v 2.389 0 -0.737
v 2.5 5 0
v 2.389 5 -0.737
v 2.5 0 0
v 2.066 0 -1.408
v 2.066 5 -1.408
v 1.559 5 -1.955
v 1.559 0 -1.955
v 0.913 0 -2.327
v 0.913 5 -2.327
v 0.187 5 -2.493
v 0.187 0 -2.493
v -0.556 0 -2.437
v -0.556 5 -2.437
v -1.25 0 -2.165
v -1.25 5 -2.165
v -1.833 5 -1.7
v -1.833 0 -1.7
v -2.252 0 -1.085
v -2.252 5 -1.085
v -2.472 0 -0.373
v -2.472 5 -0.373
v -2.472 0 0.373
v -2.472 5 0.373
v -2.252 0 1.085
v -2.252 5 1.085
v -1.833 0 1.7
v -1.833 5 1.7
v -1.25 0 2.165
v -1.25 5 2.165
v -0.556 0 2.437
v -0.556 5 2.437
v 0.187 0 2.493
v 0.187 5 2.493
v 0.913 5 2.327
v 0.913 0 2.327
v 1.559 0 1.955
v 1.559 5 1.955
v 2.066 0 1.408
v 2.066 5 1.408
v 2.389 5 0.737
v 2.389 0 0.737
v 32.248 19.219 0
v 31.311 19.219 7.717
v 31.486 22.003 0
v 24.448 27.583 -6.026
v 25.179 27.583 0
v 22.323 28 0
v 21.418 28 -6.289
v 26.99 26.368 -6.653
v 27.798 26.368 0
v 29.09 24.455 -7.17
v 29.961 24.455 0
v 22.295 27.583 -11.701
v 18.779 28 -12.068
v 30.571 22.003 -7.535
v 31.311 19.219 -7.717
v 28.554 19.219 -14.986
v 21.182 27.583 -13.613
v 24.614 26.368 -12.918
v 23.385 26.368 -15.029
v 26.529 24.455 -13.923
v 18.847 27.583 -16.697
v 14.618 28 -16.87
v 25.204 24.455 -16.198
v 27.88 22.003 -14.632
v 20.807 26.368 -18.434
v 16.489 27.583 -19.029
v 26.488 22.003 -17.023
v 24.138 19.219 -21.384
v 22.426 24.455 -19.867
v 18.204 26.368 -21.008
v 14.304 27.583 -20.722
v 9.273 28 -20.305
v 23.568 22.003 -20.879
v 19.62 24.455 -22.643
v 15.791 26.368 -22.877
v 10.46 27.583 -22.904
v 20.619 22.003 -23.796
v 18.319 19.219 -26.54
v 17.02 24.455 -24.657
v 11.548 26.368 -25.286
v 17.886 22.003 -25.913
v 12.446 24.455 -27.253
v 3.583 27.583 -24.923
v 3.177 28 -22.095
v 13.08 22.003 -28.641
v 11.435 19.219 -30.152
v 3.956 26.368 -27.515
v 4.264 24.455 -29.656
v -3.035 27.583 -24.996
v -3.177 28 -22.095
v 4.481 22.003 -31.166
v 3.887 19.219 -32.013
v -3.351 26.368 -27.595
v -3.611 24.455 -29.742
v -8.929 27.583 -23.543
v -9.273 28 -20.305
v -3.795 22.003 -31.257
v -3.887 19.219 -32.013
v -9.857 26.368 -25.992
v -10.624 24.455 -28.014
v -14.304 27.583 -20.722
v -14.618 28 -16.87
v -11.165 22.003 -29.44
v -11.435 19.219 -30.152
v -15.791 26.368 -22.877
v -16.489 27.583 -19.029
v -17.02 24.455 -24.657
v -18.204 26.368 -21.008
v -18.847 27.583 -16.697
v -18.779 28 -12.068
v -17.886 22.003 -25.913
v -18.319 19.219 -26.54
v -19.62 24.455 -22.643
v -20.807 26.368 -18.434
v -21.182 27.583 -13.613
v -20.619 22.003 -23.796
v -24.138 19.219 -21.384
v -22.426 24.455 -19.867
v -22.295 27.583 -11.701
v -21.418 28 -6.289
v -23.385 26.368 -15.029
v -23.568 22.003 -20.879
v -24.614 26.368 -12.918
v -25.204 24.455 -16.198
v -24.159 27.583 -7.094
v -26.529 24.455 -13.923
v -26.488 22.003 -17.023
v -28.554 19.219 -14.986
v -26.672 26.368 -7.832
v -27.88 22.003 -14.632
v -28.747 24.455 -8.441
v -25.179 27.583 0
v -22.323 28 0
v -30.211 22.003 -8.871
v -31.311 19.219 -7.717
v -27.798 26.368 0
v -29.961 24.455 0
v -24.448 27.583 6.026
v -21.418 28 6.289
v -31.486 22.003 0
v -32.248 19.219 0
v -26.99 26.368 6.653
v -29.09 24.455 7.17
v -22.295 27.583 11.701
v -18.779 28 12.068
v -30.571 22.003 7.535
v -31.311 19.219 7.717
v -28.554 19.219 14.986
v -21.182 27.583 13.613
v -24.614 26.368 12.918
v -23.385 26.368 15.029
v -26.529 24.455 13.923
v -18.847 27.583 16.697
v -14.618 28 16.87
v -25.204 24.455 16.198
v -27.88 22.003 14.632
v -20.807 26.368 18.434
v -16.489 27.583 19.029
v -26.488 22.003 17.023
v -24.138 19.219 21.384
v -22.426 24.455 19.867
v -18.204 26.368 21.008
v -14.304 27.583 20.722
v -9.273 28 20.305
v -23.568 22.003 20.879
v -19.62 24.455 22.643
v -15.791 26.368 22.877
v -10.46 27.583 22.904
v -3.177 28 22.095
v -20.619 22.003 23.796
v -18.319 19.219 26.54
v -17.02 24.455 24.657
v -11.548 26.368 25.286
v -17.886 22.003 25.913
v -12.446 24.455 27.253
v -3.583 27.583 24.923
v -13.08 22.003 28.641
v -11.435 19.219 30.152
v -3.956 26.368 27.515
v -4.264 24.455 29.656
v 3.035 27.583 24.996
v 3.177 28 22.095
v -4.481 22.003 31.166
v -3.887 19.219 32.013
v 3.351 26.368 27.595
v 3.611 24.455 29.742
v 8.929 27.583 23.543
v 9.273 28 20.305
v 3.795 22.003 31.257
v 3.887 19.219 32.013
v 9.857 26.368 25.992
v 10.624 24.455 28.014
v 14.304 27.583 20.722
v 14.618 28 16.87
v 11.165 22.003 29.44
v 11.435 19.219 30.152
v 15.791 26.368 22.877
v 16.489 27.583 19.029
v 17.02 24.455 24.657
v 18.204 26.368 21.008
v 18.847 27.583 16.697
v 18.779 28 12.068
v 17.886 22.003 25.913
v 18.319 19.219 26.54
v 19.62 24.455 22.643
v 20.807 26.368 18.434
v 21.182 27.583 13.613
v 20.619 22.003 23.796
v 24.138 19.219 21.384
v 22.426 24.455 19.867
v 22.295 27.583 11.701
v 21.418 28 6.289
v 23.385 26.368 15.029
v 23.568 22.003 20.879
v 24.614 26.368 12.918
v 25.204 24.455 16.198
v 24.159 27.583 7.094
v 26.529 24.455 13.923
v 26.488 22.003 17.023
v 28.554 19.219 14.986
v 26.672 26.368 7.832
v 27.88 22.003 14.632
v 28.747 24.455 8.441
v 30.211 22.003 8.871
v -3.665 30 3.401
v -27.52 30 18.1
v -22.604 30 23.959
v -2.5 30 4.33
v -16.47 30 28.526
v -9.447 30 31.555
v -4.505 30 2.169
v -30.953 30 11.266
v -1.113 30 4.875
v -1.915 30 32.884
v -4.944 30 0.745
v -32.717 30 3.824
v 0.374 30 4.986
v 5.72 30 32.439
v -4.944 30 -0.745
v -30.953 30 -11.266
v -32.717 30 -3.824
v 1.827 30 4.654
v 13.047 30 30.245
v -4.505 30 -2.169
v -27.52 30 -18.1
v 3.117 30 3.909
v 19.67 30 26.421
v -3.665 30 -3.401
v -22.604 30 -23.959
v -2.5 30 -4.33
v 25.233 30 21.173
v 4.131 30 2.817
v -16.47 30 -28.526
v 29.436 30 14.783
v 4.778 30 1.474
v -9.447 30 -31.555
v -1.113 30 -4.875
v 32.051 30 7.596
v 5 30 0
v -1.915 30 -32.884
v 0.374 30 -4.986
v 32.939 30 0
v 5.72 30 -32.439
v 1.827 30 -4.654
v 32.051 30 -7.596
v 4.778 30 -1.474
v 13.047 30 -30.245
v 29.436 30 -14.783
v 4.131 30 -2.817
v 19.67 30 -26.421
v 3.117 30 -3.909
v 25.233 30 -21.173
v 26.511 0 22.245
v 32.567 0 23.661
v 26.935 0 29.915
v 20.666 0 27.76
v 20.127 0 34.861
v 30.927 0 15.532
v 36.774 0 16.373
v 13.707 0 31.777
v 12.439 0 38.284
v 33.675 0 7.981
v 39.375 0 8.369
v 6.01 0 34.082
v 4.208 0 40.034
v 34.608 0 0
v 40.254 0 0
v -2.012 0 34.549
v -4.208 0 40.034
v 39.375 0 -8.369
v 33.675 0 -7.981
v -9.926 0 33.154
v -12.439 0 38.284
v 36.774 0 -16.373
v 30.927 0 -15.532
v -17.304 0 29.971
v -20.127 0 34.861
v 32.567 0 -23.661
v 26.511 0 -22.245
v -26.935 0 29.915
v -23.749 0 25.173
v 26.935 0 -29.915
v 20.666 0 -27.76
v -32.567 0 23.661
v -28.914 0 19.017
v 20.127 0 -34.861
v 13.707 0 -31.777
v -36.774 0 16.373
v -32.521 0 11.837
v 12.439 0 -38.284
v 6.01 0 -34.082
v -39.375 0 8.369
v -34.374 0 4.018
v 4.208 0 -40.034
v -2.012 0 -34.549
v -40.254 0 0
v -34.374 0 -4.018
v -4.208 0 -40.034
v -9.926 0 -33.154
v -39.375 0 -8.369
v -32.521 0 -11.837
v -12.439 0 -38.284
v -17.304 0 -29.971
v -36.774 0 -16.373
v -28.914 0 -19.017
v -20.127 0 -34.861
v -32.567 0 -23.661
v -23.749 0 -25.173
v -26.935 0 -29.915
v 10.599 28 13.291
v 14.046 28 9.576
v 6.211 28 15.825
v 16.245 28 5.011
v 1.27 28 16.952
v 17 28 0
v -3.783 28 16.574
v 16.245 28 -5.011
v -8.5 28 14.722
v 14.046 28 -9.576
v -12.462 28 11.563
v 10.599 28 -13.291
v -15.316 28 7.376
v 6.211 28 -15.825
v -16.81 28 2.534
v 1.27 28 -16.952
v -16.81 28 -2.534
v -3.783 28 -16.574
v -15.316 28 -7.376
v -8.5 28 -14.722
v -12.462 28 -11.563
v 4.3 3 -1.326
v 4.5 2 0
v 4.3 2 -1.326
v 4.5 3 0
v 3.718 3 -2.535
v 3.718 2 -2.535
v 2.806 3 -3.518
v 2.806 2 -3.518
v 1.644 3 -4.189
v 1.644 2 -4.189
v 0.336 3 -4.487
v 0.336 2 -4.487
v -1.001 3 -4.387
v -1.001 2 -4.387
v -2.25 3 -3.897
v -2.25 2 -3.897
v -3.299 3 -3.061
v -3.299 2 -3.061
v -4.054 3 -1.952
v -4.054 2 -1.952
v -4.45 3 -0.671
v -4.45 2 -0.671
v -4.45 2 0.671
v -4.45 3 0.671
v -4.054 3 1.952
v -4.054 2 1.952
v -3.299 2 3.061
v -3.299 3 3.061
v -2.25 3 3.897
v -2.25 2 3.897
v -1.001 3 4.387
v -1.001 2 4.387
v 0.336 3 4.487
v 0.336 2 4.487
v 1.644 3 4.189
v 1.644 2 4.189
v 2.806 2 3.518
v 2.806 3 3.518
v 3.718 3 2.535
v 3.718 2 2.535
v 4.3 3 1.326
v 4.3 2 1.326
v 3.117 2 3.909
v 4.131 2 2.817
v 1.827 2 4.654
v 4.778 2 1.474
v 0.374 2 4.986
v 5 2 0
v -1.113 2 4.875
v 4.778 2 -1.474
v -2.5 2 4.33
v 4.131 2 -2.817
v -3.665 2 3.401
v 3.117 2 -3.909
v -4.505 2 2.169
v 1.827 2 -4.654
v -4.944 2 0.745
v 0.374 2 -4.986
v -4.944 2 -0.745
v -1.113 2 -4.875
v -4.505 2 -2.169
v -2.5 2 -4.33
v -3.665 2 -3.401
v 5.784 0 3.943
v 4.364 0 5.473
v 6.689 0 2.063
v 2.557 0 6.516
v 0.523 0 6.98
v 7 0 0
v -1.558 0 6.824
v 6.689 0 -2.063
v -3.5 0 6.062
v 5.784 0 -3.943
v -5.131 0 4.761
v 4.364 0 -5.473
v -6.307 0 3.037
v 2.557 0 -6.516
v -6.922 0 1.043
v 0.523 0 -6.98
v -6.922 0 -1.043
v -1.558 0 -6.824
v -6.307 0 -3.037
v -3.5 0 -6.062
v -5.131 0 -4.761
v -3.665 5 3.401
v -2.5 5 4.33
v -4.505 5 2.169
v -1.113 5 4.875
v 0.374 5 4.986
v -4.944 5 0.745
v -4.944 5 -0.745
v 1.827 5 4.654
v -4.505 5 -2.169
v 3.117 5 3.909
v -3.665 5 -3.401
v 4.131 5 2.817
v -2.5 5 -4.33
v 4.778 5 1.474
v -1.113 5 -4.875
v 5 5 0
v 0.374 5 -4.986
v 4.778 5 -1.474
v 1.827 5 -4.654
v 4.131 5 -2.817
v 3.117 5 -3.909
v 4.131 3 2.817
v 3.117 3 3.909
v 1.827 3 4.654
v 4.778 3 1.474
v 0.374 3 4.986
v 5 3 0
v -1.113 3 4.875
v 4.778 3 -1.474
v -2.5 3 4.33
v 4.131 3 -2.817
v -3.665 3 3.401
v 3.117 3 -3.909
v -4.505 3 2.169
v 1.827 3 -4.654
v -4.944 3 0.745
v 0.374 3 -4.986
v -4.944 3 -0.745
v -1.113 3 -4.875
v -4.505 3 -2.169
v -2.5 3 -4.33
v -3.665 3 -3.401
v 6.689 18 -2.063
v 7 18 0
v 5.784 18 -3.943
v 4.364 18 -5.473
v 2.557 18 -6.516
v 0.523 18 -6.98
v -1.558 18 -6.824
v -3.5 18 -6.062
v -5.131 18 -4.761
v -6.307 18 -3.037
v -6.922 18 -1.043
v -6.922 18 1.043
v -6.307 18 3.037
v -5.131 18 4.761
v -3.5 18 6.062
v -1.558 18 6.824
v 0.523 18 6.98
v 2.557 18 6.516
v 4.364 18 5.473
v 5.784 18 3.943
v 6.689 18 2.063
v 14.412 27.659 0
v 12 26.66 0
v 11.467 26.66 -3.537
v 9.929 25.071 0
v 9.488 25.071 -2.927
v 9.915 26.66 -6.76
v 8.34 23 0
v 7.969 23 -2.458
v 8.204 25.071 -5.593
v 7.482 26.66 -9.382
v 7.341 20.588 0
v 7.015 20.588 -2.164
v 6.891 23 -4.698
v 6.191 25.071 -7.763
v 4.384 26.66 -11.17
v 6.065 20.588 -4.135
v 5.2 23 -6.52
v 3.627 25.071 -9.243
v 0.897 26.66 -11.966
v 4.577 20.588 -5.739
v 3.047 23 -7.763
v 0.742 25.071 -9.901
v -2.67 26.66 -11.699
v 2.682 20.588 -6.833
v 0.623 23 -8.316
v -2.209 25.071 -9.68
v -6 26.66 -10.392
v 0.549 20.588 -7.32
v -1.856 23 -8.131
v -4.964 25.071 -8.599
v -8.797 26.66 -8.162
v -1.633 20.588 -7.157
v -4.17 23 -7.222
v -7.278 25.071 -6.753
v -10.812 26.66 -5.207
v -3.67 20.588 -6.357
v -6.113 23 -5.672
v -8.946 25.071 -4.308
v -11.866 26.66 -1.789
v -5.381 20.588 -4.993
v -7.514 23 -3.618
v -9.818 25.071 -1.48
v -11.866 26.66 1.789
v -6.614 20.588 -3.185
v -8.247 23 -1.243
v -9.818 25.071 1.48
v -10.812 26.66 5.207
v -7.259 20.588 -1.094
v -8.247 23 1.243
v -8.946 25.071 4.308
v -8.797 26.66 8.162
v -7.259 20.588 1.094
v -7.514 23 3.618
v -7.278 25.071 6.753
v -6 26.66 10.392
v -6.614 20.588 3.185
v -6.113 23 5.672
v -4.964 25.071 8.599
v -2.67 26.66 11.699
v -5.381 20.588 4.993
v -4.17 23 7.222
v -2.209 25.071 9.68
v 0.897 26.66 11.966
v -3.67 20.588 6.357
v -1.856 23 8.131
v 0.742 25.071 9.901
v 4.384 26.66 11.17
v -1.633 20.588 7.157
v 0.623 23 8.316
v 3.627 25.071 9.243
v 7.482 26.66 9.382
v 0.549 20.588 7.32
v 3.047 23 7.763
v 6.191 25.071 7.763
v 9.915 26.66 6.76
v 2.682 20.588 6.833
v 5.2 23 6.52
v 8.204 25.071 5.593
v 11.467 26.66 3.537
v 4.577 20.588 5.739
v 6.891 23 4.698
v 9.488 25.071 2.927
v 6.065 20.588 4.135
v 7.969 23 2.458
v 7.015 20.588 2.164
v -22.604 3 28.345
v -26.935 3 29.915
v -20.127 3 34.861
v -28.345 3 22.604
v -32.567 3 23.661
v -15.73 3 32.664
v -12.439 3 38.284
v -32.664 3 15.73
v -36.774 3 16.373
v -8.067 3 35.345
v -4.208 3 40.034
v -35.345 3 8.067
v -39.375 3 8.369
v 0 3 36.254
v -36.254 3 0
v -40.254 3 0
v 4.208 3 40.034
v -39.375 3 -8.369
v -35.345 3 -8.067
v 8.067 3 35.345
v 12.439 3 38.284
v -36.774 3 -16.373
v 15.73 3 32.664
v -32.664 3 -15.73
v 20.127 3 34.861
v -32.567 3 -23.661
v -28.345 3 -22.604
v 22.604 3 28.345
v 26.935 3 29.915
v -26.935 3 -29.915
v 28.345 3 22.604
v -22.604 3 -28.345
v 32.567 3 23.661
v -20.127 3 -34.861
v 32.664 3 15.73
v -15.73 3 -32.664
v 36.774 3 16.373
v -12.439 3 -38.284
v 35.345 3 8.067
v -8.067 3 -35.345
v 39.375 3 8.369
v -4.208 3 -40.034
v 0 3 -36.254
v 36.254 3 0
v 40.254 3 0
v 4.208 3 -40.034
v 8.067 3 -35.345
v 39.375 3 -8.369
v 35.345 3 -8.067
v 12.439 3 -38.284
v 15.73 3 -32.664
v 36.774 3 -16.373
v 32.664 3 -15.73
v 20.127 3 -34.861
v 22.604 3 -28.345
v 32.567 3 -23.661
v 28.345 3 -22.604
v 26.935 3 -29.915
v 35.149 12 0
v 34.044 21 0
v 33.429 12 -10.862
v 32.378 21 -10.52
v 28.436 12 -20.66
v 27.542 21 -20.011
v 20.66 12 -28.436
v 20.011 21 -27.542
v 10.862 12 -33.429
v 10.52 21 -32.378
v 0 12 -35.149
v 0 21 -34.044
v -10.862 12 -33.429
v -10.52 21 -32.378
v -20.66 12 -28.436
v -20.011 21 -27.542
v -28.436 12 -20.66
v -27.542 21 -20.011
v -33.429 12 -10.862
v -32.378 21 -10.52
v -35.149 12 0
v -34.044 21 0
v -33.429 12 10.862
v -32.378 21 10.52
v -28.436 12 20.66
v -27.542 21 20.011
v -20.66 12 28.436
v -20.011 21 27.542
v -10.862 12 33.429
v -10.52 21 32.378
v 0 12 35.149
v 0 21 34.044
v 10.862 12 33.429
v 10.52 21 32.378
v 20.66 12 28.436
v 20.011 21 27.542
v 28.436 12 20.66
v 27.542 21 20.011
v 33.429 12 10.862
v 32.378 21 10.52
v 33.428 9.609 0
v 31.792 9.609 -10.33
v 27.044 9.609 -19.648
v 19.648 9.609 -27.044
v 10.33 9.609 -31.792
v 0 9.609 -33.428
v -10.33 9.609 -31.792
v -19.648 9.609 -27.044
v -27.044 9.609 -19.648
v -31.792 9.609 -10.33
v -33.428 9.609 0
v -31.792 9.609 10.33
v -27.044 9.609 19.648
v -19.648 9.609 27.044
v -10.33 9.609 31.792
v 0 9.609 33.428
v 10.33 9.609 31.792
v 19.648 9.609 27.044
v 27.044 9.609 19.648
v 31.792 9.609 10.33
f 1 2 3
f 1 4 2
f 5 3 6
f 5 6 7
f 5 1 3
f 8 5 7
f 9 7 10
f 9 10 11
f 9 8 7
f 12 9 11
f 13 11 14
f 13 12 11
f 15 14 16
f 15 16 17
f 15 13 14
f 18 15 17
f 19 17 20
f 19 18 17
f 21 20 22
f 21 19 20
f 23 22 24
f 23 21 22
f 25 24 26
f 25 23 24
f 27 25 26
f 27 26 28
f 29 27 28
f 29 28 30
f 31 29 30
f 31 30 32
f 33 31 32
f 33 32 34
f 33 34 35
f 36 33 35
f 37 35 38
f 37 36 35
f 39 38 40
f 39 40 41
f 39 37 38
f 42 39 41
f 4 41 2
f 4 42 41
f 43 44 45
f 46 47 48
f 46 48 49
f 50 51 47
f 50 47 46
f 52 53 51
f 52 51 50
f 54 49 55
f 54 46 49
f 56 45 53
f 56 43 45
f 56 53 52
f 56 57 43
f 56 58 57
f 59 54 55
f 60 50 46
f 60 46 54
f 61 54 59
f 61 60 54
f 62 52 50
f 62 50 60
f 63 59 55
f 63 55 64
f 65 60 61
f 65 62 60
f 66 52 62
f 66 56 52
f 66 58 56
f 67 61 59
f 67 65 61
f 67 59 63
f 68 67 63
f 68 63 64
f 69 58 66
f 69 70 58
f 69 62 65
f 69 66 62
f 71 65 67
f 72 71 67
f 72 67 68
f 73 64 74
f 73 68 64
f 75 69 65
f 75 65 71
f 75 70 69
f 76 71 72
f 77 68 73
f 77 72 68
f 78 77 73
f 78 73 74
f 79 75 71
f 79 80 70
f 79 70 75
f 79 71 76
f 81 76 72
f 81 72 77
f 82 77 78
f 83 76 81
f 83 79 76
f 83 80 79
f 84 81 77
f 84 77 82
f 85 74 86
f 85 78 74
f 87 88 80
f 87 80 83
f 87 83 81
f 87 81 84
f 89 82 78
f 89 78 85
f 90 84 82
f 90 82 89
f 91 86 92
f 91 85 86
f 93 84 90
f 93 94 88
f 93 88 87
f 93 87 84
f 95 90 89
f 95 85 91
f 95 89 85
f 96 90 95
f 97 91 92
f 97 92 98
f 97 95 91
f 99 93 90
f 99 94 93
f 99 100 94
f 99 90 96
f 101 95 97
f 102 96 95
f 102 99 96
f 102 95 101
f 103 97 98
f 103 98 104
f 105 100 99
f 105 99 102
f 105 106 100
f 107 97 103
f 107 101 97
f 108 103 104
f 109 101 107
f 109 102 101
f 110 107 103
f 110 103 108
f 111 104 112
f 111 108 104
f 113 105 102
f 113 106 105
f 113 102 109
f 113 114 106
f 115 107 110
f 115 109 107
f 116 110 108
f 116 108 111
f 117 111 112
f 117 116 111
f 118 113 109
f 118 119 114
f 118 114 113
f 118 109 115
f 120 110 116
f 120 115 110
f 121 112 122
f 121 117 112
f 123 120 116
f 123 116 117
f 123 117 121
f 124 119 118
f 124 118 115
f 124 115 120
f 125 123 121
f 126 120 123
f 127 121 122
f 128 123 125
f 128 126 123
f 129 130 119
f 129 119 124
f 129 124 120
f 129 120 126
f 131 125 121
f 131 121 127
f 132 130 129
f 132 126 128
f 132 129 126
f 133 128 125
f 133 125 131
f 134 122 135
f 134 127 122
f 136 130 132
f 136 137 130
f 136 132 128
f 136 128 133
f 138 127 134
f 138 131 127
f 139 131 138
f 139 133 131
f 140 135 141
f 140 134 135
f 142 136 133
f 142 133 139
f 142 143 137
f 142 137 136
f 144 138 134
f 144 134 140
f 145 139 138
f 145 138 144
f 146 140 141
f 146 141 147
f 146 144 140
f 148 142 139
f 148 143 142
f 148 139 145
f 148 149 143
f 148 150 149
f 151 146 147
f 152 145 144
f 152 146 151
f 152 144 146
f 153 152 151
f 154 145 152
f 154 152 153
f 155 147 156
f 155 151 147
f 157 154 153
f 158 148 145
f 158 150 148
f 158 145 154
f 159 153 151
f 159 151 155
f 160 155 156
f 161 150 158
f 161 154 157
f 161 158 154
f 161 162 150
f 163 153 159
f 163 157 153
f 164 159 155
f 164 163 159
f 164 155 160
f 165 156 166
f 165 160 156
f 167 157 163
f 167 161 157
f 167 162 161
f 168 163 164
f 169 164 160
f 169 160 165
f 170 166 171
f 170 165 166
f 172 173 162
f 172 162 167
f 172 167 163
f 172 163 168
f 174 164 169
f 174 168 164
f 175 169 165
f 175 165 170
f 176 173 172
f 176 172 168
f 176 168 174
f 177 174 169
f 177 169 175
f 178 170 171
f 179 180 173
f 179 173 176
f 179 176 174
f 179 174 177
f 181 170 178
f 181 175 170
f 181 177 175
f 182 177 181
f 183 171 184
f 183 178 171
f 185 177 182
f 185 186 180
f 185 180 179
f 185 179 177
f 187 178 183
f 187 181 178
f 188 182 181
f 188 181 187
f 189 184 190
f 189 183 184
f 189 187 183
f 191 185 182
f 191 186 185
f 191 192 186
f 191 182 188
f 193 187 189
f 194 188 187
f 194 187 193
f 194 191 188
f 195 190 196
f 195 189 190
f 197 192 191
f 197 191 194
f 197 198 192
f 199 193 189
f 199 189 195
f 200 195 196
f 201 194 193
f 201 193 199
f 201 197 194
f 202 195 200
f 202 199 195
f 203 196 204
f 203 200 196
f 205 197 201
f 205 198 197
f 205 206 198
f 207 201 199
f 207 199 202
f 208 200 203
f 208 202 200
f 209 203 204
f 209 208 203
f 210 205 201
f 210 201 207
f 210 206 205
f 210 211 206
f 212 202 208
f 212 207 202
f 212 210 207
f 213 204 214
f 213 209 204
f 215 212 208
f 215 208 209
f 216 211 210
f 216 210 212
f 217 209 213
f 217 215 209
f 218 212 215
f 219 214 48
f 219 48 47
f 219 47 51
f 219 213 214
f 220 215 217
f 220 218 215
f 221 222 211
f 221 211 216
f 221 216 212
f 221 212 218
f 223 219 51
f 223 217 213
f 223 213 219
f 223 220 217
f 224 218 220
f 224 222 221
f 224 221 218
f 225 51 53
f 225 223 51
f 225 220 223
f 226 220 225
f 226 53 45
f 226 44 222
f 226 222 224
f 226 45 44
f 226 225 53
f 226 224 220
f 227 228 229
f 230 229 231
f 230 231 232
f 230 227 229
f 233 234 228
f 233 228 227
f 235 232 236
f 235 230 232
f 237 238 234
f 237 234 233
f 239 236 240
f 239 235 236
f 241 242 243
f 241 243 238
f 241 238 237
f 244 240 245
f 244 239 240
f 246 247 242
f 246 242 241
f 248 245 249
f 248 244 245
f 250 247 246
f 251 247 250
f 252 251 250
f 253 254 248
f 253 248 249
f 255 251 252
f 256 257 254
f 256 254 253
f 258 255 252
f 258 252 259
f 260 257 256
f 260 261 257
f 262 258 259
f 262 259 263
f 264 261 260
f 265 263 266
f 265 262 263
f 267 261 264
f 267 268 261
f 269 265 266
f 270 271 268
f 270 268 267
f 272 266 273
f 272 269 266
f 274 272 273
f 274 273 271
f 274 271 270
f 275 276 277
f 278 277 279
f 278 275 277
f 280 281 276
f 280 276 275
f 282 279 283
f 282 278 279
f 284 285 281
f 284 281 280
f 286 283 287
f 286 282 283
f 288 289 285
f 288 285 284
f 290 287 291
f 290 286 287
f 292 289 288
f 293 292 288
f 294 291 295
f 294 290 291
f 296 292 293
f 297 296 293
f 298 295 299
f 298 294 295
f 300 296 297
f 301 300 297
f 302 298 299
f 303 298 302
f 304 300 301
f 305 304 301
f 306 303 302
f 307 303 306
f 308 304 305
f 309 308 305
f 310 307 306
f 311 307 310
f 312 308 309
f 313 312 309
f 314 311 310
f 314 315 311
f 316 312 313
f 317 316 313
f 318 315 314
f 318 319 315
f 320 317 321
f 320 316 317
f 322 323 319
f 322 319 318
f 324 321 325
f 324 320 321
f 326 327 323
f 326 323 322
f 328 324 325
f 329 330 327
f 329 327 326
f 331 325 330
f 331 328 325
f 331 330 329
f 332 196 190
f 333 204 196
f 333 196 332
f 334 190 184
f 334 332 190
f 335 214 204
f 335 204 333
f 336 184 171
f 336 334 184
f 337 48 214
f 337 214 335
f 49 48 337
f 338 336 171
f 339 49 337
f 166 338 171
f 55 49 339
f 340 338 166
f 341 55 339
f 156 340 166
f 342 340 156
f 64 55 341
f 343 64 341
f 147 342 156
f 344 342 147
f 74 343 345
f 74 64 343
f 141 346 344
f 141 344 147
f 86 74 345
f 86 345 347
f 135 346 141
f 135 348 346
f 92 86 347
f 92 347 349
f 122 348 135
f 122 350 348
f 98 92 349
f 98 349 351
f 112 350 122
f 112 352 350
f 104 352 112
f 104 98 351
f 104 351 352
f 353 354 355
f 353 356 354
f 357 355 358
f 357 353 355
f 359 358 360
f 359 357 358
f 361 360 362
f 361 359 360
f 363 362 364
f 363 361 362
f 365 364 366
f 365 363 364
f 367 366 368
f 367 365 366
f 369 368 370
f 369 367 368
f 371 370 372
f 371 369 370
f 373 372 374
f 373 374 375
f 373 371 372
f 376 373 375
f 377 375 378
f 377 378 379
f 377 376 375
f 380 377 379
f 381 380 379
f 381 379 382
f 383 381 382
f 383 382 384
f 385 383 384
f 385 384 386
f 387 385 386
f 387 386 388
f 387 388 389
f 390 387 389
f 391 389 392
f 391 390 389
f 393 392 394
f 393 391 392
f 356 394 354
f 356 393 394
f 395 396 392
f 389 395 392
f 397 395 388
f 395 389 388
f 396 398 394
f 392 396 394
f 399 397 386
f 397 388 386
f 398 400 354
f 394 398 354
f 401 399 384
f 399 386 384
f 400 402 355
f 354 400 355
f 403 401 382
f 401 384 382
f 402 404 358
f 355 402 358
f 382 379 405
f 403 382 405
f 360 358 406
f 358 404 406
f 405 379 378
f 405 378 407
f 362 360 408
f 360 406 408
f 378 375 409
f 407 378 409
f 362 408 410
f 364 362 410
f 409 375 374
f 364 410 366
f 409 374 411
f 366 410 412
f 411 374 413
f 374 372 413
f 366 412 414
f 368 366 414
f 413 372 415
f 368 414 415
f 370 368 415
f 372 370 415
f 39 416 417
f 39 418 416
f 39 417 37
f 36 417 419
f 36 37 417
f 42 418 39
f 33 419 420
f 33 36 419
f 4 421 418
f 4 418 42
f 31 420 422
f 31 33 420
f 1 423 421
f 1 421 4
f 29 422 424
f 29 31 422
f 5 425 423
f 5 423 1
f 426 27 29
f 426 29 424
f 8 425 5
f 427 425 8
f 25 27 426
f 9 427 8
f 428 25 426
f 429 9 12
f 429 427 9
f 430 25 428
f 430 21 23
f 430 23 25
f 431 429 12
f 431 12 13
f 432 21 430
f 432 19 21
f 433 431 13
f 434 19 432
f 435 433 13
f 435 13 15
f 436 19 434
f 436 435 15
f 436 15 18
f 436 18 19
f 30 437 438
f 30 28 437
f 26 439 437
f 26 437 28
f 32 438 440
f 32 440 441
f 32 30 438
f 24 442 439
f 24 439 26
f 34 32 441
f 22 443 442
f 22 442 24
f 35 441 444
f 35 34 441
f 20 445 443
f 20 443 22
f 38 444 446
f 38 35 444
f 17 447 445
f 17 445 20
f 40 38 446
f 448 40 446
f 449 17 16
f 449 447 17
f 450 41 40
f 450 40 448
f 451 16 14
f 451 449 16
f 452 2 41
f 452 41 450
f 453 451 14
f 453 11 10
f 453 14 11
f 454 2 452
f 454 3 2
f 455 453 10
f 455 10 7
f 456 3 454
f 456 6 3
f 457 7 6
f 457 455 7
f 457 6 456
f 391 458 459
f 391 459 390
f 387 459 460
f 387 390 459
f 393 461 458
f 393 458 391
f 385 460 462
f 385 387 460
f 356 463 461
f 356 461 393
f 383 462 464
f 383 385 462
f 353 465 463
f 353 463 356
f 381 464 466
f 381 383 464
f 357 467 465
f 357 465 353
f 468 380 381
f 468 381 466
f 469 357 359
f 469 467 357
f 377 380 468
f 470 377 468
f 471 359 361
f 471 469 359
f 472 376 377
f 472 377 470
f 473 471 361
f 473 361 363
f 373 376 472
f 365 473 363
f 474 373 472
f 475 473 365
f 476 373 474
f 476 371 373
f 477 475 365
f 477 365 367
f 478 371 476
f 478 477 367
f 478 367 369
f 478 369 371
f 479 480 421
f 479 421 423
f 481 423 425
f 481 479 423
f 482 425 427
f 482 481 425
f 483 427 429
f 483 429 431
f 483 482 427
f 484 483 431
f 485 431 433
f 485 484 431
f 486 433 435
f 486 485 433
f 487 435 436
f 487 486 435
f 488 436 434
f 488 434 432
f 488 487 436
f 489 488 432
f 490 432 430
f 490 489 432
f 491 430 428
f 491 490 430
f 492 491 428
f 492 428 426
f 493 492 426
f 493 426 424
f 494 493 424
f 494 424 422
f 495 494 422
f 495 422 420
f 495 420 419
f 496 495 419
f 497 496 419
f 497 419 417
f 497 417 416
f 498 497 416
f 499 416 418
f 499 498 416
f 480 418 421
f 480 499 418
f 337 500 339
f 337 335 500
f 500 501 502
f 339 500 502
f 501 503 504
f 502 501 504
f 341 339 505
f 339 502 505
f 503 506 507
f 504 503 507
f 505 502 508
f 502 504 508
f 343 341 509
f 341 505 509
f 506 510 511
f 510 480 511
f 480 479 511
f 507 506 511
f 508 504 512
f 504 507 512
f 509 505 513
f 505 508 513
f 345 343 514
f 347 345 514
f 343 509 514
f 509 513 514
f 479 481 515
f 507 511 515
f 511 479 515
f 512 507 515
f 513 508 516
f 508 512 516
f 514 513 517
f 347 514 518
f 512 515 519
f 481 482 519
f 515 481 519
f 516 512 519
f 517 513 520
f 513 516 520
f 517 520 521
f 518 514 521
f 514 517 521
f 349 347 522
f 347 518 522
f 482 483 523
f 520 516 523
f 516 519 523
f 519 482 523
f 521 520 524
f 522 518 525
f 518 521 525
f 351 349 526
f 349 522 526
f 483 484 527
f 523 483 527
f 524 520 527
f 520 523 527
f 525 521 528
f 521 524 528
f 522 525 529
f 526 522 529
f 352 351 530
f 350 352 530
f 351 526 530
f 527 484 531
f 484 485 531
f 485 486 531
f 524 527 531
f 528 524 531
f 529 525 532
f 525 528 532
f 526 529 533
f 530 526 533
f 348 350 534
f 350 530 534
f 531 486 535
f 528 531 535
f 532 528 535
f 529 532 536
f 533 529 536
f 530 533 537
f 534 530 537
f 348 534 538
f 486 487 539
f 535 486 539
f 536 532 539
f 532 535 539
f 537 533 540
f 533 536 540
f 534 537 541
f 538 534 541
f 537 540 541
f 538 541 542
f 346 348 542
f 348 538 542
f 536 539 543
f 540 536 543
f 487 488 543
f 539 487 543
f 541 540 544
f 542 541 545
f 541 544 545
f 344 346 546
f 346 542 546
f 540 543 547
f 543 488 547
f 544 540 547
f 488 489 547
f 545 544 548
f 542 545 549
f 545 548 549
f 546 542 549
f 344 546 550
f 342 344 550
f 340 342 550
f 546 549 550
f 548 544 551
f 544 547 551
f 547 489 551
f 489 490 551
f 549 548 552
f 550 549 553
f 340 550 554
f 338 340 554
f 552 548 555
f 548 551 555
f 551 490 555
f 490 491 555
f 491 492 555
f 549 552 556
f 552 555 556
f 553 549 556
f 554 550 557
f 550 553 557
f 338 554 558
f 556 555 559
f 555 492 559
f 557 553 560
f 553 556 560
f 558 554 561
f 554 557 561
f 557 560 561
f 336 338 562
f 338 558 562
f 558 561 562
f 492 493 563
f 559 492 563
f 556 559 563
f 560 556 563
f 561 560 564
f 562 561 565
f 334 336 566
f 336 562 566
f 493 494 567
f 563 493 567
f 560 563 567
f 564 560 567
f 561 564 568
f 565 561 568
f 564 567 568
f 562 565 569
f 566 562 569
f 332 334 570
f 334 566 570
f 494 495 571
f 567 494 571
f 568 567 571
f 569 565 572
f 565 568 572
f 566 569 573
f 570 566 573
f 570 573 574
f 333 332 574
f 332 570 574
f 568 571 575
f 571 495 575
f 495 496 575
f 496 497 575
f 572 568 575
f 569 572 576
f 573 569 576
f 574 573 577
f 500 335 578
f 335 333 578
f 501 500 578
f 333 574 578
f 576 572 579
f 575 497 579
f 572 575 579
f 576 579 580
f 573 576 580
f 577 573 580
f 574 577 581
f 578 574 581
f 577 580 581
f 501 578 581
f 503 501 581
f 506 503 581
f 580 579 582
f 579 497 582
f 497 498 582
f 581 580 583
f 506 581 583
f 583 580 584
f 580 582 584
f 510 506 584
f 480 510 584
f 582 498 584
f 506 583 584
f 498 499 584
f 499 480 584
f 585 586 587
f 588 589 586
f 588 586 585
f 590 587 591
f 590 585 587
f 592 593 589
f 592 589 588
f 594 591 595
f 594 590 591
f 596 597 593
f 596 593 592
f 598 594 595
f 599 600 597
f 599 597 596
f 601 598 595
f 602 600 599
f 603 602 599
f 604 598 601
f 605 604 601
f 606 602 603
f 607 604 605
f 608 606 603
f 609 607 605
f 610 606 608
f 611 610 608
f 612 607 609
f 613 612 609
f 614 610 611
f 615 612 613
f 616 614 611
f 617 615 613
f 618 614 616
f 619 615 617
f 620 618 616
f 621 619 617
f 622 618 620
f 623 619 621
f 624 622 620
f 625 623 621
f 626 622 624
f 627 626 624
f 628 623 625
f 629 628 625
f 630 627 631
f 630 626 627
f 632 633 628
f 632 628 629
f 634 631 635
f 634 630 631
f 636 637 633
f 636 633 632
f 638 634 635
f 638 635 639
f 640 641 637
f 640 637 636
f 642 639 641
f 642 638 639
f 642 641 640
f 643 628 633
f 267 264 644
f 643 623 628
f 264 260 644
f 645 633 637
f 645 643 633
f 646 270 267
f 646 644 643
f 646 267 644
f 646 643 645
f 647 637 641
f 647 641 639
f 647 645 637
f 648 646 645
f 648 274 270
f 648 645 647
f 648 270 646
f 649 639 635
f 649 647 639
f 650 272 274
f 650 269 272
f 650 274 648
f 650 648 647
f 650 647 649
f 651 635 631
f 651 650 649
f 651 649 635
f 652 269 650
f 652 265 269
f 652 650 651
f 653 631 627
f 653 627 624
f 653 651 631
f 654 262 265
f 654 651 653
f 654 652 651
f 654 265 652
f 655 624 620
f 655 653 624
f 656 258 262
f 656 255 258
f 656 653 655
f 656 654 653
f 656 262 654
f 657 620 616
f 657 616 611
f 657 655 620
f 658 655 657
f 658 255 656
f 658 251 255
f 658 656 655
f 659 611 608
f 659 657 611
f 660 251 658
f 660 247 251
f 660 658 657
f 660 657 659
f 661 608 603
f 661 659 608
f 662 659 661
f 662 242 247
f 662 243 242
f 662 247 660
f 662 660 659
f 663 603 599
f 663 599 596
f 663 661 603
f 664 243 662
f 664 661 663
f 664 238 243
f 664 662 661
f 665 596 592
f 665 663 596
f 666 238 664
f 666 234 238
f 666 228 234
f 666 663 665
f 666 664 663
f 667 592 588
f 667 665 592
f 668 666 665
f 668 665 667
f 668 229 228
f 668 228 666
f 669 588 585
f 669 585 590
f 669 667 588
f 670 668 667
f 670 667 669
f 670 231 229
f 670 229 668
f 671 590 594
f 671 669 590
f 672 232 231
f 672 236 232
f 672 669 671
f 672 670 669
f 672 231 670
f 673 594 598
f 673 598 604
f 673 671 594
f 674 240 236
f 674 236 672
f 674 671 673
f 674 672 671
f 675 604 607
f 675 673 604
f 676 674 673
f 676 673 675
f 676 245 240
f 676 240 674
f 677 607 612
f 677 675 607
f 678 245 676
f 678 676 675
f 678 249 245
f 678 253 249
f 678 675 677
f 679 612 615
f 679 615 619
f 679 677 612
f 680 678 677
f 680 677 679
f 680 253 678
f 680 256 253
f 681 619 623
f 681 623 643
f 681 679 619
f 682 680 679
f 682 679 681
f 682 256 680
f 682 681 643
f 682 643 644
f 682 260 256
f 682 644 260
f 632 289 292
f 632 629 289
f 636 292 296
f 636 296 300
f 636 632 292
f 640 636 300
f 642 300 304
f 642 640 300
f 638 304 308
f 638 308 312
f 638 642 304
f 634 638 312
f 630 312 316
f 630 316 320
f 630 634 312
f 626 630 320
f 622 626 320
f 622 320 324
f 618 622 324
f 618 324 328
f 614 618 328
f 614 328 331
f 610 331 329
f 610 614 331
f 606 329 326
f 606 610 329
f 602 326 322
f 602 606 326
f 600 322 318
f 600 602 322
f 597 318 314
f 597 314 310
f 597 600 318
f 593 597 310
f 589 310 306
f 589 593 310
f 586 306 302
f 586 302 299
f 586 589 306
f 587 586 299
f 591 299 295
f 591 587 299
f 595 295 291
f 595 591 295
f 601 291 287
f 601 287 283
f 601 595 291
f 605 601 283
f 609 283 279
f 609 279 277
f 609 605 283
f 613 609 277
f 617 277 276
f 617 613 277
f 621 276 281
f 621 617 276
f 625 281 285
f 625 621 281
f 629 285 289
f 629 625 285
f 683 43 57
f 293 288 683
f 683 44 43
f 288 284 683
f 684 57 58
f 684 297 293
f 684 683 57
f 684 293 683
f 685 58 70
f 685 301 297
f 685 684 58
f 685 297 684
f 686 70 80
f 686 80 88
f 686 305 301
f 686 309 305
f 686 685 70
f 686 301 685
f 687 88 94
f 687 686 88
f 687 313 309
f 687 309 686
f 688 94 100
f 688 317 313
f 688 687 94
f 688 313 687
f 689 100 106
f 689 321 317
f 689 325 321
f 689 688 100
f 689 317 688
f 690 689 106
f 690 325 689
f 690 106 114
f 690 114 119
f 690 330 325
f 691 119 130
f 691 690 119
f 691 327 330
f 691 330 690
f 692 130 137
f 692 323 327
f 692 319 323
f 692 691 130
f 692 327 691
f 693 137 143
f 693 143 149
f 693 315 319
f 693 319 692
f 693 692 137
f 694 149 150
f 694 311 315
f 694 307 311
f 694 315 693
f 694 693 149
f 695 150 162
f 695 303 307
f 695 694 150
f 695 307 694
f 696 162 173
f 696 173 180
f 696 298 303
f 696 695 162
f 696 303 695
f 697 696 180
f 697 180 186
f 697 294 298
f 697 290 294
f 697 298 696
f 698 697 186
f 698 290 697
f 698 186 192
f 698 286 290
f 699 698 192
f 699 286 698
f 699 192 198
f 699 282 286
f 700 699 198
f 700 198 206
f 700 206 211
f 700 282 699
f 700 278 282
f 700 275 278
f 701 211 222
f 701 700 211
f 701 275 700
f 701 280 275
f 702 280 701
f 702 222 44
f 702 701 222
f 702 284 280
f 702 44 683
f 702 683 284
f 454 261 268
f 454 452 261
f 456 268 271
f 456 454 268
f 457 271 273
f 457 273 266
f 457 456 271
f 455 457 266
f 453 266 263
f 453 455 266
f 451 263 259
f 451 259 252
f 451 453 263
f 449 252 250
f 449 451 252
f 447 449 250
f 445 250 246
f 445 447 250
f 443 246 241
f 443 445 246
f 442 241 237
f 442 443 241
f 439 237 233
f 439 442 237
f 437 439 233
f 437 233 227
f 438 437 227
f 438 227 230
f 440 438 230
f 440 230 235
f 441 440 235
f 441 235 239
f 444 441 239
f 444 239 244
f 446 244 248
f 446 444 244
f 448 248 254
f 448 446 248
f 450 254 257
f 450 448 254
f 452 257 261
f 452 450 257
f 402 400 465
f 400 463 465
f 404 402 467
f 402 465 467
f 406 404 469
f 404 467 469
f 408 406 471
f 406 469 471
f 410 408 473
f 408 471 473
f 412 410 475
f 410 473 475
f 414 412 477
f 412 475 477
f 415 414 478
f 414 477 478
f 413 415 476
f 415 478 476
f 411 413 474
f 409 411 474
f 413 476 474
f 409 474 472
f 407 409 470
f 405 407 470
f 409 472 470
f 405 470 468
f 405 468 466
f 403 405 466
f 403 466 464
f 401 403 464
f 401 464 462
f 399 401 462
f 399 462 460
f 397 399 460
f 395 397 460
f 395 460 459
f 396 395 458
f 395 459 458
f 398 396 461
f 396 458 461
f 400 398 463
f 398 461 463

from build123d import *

# Parameters (mm, degrees)
R_VOL_MINCE1_OUTLINE_W = 0.5
R_VOL_MINCE1_OUTLINE_H = 1
CONG_2_R               = 10
CONG_3_R               = 10


# Read off the part's stored shape, not the designer's step: Révol.-Mince1
with BuildPart() as part:
    # Révol.-Mince1 outline → Révol.-Mince1 (revolve)
    with BuildSketch(Plane.XY):
        Polygon((2.5, 5), (2.5, 0), (7, 0), (7, 28), (31.169797205, 28), (34.60776491, 0), (40.254430878, 0), (40.254430878, 3), (36.254430878, 3), (32.939247734, 30), (5, 30), (5, 5), align=None)
        with Locations((4.75, 2.5)):
            Rectangle(R_VOL_MINCE1_OUTLINE_W, R_VOL_MINCE1_OUTLINE_H, mode=Mode.SUBTRACT)
    revolve(axis=Axis((0, 0, 0), (0, 1, 0)))

    # Congé2
    cong_2_edges = [part.edges().sort_by_distance(p)[0] for p in [
        (-31.169797205, 28, 0),
    ]]
    fillet(cong_2_edges, radius=CONG_2_R)

    # Congé3
    cong_3_edges = [part.edges().sort_by_distance(p)[0] for p in [
        (-7, 28, 0),
    ]]
    fillet(cong_3_edges, radius=CONG_3_R)


solid = part.part
